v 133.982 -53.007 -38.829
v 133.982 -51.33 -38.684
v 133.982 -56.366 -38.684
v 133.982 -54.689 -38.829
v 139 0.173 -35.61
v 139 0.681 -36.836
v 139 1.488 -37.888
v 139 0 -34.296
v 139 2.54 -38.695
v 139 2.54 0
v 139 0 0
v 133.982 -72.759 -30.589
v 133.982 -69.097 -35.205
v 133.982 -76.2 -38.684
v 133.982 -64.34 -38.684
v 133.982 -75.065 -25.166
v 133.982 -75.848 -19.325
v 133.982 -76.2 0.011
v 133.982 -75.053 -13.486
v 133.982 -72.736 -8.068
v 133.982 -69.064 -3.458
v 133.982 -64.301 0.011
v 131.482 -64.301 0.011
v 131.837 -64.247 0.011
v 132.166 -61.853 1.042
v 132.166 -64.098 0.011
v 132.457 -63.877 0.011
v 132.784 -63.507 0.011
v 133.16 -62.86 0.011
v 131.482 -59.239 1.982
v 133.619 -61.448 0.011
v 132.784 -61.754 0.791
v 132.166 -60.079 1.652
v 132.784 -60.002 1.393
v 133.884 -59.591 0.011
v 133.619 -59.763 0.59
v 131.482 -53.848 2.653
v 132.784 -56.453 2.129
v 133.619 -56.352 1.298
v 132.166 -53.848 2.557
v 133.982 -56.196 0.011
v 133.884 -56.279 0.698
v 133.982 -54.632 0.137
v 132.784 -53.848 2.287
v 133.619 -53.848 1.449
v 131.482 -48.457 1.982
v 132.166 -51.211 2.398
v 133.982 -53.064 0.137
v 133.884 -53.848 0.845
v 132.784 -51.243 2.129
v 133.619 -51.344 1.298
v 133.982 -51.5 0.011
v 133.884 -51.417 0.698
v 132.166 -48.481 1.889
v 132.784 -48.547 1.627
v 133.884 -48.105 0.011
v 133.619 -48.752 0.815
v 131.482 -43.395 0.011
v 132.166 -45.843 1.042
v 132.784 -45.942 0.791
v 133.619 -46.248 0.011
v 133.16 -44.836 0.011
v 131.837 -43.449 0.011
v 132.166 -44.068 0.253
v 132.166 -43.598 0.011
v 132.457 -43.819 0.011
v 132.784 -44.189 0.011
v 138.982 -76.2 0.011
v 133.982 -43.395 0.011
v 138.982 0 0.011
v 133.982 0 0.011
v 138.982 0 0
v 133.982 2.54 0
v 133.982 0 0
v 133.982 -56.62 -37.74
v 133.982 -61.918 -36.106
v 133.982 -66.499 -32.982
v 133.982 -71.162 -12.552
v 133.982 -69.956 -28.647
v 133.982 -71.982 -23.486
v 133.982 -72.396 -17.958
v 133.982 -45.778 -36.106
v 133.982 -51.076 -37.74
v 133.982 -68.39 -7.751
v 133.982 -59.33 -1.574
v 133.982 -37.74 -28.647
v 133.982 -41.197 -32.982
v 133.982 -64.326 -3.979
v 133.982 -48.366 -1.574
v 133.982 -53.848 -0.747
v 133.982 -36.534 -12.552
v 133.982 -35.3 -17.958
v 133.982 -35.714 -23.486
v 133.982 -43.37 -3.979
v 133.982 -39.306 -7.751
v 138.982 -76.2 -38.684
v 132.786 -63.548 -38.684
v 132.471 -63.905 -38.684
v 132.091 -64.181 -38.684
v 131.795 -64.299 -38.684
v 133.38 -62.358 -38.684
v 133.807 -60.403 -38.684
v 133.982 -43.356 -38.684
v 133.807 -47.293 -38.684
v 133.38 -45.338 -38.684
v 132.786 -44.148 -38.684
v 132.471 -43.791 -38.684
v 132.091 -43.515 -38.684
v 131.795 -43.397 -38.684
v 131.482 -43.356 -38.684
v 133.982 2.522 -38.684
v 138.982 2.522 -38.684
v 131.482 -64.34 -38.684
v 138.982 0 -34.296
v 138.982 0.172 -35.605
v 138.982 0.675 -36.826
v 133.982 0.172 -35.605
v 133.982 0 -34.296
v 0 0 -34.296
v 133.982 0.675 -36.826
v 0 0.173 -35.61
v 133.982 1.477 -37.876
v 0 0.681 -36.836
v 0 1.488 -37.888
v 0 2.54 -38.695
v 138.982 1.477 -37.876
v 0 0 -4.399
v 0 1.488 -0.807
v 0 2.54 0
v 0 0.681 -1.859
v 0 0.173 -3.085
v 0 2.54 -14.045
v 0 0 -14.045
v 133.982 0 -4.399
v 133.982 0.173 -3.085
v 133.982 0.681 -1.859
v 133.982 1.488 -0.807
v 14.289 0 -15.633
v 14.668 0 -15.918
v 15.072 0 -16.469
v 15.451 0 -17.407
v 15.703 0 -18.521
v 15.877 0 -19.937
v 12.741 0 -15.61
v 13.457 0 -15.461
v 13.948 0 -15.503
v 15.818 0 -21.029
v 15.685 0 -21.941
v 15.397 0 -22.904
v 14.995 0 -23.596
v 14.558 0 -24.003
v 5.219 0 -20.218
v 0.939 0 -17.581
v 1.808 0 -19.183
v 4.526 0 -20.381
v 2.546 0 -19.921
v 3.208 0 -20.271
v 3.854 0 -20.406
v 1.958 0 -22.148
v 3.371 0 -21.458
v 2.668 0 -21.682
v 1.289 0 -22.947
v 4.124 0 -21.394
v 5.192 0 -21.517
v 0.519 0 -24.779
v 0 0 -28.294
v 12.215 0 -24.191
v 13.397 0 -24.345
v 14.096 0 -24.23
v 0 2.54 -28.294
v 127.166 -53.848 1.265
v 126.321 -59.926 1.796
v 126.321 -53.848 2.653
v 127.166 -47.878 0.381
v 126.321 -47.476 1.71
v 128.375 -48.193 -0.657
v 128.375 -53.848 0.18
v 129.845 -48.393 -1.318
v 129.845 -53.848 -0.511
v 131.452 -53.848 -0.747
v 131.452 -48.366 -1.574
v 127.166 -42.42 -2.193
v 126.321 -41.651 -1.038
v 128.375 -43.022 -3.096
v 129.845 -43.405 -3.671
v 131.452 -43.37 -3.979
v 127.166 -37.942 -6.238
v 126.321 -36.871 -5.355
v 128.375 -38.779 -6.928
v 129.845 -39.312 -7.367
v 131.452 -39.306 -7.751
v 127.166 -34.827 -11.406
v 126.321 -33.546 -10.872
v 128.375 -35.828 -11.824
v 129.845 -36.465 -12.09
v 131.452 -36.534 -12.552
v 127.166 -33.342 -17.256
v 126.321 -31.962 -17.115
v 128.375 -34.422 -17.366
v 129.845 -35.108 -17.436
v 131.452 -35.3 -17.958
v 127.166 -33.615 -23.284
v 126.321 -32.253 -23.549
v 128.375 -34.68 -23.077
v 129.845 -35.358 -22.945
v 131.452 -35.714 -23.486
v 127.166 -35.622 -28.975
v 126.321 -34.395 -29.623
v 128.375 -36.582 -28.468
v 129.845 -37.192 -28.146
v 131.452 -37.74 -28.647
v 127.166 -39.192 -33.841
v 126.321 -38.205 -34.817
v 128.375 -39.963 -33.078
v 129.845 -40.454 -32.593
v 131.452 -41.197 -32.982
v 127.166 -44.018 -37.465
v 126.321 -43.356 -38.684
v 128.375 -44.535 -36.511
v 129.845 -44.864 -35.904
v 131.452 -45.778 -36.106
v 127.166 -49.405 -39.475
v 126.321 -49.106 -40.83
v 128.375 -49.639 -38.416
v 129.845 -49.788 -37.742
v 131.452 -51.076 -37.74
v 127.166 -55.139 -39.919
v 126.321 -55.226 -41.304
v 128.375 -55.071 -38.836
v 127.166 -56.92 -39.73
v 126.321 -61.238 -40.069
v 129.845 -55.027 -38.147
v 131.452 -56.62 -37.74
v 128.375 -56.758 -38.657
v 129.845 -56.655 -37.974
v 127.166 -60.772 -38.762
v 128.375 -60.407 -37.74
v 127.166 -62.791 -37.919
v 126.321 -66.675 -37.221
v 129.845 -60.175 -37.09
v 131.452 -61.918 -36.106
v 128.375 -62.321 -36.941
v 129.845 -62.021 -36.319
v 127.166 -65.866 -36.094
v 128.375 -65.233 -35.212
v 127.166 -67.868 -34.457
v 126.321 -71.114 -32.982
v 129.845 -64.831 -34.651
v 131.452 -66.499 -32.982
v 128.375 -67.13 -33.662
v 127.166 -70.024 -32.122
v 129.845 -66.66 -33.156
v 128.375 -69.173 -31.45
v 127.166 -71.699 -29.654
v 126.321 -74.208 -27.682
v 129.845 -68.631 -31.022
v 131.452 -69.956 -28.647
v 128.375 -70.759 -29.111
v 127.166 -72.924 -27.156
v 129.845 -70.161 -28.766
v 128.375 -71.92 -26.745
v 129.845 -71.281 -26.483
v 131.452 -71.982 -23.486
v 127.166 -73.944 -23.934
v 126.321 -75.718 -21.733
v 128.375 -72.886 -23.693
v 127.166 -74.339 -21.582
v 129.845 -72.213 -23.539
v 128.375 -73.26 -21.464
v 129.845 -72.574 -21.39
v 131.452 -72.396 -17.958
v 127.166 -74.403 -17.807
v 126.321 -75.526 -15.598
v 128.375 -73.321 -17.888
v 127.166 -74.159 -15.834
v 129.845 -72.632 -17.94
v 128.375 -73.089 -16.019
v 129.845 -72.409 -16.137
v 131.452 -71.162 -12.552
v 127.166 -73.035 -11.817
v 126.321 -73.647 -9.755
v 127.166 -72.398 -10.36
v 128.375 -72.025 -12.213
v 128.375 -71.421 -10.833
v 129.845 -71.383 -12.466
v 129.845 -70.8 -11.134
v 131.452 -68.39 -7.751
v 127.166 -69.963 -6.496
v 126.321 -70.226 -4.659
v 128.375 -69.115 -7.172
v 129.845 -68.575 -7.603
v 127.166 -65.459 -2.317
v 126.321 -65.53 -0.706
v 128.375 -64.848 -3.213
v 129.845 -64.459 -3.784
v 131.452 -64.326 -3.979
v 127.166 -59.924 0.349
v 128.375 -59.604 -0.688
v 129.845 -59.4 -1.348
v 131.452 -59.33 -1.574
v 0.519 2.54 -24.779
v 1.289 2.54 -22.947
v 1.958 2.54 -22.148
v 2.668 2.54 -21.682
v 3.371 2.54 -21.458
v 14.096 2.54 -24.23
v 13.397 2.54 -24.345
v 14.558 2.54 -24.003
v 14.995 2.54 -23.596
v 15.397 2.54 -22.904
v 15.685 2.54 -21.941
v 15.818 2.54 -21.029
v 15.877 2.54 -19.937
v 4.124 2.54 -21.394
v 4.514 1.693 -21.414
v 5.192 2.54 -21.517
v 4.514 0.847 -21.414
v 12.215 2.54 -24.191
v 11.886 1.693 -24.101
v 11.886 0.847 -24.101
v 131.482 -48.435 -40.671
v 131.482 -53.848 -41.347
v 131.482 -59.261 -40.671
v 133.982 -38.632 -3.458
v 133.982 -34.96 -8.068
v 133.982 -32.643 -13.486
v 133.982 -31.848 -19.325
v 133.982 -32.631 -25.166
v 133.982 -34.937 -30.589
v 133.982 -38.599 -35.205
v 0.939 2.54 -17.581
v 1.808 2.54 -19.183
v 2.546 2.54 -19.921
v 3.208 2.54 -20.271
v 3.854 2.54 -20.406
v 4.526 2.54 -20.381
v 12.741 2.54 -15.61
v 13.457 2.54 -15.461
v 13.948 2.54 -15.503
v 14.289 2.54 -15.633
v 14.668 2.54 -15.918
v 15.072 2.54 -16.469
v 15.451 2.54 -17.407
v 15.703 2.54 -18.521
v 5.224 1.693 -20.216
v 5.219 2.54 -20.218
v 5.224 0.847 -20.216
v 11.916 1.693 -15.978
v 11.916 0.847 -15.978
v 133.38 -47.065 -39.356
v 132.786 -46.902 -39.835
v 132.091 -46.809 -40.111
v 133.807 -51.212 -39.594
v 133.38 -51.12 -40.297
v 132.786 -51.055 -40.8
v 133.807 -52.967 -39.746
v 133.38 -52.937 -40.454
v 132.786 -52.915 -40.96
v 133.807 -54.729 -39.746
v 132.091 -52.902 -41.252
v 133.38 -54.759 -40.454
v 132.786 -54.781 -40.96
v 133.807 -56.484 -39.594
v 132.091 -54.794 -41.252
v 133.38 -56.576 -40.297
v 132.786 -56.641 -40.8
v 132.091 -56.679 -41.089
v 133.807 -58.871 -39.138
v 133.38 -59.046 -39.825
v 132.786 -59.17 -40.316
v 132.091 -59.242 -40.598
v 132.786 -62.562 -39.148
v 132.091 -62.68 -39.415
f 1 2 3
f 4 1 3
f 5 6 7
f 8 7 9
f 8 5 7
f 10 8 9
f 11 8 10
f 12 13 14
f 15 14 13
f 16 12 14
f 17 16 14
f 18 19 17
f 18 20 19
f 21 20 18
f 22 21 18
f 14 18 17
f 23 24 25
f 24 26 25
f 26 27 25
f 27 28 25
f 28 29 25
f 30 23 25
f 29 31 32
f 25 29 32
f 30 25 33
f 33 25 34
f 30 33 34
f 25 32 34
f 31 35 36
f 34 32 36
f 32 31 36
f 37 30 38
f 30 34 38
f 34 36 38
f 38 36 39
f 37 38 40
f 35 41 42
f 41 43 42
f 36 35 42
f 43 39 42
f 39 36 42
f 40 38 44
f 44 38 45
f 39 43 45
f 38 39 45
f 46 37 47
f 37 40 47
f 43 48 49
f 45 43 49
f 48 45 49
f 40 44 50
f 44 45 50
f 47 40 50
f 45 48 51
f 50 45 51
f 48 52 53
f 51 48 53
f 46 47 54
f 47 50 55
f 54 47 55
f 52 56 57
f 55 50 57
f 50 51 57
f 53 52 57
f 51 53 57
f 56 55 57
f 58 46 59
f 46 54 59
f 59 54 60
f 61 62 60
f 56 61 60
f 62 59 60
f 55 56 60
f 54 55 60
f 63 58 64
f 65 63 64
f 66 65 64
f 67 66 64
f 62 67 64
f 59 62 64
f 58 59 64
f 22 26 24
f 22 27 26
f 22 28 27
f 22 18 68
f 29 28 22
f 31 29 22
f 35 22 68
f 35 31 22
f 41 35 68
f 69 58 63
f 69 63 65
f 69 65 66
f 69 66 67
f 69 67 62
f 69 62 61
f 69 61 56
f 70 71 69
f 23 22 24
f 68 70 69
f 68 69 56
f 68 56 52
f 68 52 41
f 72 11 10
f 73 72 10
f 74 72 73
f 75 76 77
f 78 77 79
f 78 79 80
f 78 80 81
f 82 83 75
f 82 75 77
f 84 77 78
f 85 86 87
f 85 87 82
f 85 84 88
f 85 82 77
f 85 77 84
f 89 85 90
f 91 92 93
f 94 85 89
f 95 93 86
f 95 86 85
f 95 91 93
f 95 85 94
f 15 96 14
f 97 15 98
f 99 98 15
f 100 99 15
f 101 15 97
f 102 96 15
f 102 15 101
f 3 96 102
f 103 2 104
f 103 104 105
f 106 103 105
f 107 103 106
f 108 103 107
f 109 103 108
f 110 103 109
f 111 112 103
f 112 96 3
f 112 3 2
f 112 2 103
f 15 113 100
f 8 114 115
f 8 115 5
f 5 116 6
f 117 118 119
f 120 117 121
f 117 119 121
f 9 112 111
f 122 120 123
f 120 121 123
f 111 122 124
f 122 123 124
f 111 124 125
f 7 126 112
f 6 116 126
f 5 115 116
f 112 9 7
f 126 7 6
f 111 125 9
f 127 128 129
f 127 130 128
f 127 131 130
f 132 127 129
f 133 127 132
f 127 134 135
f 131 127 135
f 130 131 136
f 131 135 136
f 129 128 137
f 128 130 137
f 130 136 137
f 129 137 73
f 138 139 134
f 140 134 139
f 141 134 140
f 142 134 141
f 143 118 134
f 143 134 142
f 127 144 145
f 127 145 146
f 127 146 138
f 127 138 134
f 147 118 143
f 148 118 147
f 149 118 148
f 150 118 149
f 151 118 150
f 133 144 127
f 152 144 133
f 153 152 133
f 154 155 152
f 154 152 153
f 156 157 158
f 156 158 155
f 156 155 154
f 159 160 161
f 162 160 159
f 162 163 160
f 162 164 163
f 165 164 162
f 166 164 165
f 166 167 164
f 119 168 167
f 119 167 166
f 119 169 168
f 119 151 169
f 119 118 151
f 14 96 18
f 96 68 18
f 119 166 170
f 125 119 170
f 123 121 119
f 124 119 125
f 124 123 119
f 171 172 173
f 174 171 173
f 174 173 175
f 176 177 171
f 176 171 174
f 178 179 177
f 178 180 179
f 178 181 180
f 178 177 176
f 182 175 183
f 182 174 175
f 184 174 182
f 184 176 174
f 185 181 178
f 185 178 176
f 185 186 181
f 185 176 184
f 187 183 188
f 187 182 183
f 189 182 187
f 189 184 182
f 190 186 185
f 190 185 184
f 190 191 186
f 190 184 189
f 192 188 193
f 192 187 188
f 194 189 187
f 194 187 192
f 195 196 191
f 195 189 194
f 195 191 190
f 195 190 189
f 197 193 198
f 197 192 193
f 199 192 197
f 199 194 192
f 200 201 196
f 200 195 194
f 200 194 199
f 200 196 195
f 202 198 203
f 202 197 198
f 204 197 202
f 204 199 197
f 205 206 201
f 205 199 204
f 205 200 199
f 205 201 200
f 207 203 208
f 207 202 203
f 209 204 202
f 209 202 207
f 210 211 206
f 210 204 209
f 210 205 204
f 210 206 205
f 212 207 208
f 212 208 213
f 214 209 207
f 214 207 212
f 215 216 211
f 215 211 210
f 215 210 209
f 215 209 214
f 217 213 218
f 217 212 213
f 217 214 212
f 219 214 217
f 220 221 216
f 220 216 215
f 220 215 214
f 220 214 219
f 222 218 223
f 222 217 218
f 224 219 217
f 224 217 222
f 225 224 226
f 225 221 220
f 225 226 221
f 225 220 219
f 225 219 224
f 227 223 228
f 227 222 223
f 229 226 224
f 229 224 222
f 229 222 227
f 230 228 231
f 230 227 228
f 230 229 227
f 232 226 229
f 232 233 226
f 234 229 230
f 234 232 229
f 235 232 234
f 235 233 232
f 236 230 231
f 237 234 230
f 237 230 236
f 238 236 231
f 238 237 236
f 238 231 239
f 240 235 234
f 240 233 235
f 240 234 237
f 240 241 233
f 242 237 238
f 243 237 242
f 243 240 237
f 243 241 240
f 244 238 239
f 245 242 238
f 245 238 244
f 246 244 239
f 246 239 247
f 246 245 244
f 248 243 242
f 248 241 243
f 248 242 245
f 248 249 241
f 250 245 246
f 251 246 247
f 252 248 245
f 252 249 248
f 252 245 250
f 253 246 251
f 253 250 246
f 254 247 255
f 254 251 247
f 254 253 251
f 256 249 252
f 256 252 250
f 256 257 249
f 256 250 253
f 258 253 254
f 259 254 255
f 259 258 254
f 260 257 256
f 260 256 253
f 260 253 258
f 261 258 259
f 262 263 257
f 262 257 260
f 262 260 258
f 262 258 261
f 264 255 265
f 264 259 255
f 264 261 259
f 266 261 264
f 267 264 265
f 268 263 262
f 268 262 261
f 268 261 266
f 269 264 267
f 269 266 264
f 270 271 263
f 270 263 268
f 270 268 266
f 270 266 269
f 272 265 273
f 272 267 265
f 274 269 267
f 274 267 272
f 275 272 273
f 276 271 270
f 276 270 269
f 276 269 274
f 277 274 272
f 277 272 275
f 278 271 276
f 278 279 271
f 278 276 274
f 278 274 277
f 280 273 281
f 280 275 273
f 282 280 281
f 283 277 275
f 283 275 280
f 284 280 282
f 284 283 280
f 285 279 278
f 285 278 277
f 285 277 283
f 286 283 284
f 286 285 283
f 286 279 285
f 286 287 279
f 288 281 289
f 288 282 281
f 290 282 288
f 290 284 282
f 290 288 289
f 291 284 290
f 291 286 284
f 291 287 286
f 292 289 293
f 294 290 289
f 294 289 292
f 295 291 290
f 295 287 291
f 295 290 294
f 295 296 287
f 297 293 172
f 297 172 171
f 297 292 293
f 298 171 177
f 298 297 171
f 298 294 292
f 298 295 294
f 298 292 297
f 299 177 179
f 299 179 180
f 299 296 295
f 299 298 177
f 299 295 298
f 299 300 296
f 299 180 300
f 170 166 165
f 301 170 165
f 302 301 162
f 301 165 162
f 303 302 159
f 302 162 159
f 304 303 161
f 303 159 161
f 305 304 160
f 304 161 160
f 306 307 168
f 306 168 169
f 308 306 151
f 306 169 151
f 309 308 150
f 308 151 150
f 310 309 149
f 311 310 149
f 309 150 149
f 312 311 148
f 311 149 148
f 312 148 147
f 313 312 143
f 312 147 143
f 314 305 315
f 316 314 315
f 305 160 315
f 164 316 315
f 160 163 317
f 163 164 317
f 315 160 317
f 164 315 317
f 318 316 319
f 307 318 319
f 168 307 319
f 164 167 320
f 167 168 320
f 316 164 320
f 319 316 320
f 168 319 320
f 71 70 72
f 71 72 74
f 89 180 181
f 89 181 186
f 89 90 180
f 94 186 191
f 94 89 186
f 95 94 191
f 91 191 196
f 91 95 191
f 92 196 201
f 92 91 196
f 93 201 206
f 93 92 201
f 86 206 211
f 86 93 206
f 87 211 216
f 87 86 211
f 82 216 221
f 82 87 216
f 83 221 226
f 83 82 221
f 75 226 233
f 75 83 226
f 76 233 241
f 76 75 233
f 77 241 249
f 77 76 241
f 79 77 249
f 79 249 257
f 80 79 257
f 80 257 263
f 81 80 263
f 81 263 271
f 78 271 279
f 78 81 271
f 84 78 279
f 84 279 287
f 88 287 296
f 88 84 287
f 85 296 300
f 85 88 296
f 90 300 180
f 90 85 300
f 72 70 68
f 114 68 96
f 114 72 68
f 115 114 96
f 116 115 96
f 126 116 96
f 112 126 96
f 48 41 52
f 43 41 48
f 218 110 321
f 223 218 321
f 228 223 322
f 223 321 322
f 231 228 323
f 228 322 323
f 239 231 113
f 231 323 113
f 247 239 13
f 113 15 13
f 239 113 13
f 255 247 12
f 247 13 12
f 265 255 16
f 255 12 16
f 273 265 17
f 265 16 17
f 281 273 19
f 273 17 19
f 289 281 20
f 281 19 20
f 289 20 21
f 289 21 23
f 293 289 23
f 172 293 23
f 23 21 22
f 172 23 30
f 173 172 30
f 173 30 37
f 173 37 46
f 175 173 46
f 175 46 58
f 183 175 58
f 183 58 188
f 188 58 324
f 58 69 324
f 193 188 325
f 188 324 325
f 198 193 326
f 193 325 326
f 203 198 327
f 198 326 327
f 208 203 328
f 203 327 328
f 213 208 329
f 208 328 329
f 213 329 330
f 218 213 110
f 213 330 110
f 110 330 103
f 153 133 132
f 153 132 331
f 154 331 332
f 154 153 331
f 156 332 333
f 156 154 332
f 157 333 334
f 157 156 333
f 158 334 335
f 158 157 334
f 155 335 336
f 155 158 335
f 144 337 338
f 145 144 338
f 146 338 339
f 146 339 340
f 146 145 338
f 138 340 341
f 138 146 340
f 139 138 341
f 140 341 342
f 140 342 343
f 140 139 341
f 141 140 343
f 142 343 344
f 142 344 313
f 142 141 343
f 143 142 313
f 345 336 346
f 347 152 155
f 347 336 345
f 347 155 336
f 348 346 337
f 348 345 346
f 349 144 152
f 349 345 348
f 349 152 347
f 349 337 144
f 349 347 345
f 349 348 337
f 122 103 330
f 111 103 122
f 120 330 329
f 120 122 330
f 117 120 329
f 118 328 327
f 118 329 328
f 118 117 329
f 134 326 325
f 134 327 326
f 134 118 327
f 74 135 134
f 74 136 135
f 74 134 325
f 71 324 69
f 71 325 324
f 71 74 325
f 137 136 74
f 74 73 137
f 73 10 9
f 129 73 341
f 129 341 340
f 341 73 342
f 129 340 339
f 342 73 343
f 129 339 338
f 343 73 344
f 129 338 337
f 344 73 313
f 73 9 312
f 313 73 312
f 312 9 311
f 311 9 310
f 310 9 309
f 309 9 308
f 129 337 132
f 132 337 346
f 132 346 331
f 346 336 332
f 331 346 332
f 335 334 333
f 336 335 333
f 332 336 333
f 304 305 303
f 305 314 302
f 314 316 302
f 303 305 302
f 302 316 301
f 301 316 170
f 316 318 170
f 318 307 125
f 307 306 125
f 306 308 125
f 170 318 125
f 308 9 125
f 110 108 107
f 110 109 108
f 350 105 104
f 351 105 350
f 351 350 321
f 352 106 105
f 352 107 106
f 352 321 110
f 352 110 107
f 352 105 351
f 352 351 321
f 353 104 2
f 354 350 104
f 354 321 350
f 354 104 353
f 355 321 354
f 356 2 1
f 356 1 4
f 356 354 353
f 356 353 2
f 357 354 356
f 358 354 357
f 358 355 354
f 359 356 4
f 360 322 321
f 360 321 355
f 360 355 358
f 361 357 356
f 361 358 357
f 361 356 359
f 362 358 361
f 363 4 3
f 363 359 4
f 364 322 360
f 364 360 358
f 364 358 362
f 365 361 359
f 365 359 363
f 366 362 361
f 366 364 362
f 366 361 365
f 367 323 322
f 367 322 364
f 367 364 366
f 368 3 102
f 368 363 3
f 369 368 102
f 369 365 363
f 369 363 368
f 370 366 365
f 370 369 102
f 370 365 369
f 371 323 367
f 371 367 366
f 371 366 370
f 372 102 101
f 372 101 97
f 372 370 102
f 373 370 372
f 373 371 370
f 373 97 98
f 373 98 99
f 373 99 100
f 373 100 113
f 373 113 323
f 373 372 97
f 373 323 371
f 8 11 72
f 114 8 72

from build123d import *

# Parameters (mm, degrees)
BOSS_EXTRUDE1_DEPTH = 2.54
BOSS_EXTRUDE2_DEPTH = 76.2
SKETCH6_R           = 22
SKETCH6_R_2         = 18.600000000000005
BOSS_EXTRUDE5_DEPTH = 7.660427645478581
FILLET10_R          = 2.5
FILLET11_R          = 2.5
FILLET13_R          = 5.57093307
FILLET15_R          = 5.08
FILLET16_R          = 5.08


with BuildPart() as part:
    # Sketch1 → Boss-Extrude1 (new body)
    with BuildSketch(Plane(origin=(0, 0, 0), x_dir=(1, 0, 0), z_dir=(0, 1, 0))):
        with BuildLine():
            Line((0, 28.293848376378605), (0, 38.694970839027235))
            Line((0, 38.694970839027235), (139, 38.694970839027235))
            Line((139, 38.694970839027235), (139, 0))
            Line((139, 0), (0, 0))
            Line((0, 0), (0, 14.045240588338004))
            add(Edge.make_bspline(
                [(0, 14.045240588338004), (3.0899762489281395, 31.623018189199616), (14.68245796656543, 5.677642965238619), (15.876552294634884, 19.936564793057386)],
                knots=[0, 0, 0, 0, 1, 1, 1, 1], degree=3))
            add(Edge.make_bspline(
                [(0, 28.293848376378605), (1.0033062764081593, 11.15878467888299), (15.658213538640268, 32.998799430672), (15.876552294634884, 19.936564793057386)],
                knots=[0, 0, 0, 0, 1, 1, 1, 1], degree=3))
        make_face()
    extrude(amount=BOSS_EXTRUDE1_DEPTH)

    # Sketch5 → Boss-Extrude2 (add)
    with BuildSketch(Plane.XZ):
        Polygon((138.98190867121684, -38.68428246542061), (133.98190867121684, -38.68428246542061), (133.98190867121684, 0.01068837360662839), (138.98190867121684, 0.010688373606629), align=None)
    extrude(amount=BOSS_EXTRUDE2_DEPTH)

    # Sketch6 → Boss-Extrude5 (add)
    with BuildSketch(Plane.ZY.offset(-133.98190867121684)):
        with Locations(Location((-19.347485419513617, -53.847999999999985, 0), (0, 0, 151.515398593))):
            Circle(SKETCH6_R)
        with Locations((-19.347485419513617, -53.847999999999985)):
            Circle(SKETCH6_R_2, mode=Mode.SUBTRACT)
    extrude(amount=BOSS_EXTRUDE5_DEPTH)

    # Fillet10
    # the kernel refuses this fillet: 2.5 mm, written as the material it takes off along each edge
    with BuildSketch(Plane(origin=(133.98190867121684, -53.847999999999985, -19.347485419513617), x_dir=(0, 0.7041935749471109, -0.7100080344638416), z_dir=(0, 0.7100080344638416, 0.7041935749471109))) as fillet10_piece_1_section:
        with BuildLine():
            CenterArc((22 - FILLET10_R, FILLET10_R), FILLET10_R, 269.9999999999999, 90.00000000000011)
            Line((22 - FILLET10_R, 0), (22, 0))
            Line((22, 0), (22, FILLET10_R))
        make_face()
    fillet10_piece_1 = revolve(axis=Axis((133.98190867121684, -53.847999999999985, -19.347485419513617), (-1, 0, 0)), revolution_arc=89.52886192357941, mode=Mode.PRIVATE)
    fillet10_piece_1 = split(fillet10_piece_1, bisect_by=Plane(origin=(133.27050053527873, -53.847999999999985, -38.68428246542061), z_dir=(0, 0, -1)), keep=Keep.TOP, mode=Mode.PRIVATE)
    add(fillet10_piece_1, mode=Mode.SUBTRACT)

    # Fillet11
    fillet11_edges = [part.edges().sort_by_distance(p)[0] for p in [
        (133.98190867121684, -53.84800000000051, 2.6525145804863826),
    ]]
    fillet(fillet11_edges, radius=FILLET11_R)

    # Fillet13
    # the kernel refuses this fillet: 5.57093307 mm, written as the material it takes off along each edge
    with BuildSketch(Plane(origin=(126.32148102573827, -53.847999999999985, -19.347485419513617), x_dir=(0, 0, 1), z_dir=(0, -1, 0))) as fillet13_piece_1:
        with BuildLine():
            CenterArc((24.170933070445475, -5.130530662517188), FILLET13_R, 112.93516881526322, 67.06483118473678)
            Line((18.600000000000005, -5.130530662517188), (18.488581338591096, -5.130530662517188))
            Line((18.488581338591096, -5.130530662517188), (18.488581338591096, 0))
            Line((18.488581338591096, 0), (18.600000000000005, 0.111418661408905))
            ThreePointArc((18.600000000000005, 0.111418661408905), (20.3, 0.111418661408905), (21.956581338591086, 0.1026106132503628))
            Line((21.956581338591086, 0.1026106132503628), (21.999999999999996, 1.421e-14))
        make_face()
    revolve(axis=Axis((126.32148102573827, -53.847999999999985, -19.347485419513617), (-1, 0, 0)), mode=Mode.SUBTRACT)

    # Fillet15
    # the kernel refuses this fillet: 5.08 mm, written as the material it takes off along each edge
    with BuildSketch(Plane(origin=(-10.998522628063, 0, -38.694970839027235), x_dir=(0, 0, 1), z_dir=(1, 0, 0))) as fillet15_piece_1_section:
        with BuildLine():
            CenterArc((4.3994090512251915, -5.079999999999999), FILLET15_R, 90, 60.00000000000139)
            Line((1.8474e-13, -2.5400000000001057), (0, 0))
            Line((0, 0), (4.3994090512251915, 0))
        make_face()
    fillet15_piece_1 = extrude(amount=160.997045256126, mode=Mode.PRIVATE)
    fillet15_piece_1 = split(fillet15_piece_1, bisect_by=Plane(origin=(133.98190867121684, 0.6664663042665507, -36.831394815078376), z_dir=(-1, 0, 0)), keep=Keep.TOP, mode=Mode.PRIVATE)
    add(fillet15_piece_1, mode=Mode.SUBTRACT)
    with BuildSketch(Plane(origin=(-10.998522628063, 0, -38.694970839027235), x_dir=(0, 0, 1), z_dir=(1, 0, 0))) as fillet15_piece_2_section:
        with BuildLine():
            CenterArc((4.3994090512251915, -5.079999999999999), FILLET15_R, 90, 60.00000000000139)
            Line((1.8474e-13, -2.5400000000001057), (0, 0))
            Line((0, 0), (4.3994090512251915, 0))
        make_face()
    fillet15_piece_2 = extrude(amount=160.997045256126, mode=Mode.PRIVATE)
    fillet15_piece_2 = split(fillet15_piece_2, bisect_by=Plane(origin=(136.48190867121684, 2.530272803909126, -38.68428246542061), z_dir=(0, 0, -1)), keep=Keep.TOP, mode=Mode.PRIVATE)
    add(fillet15_piece_2, mode=Mode.SUBTRACT)
    with BuildSketch(Plane(origin=(-10.998522628063, 0, -38.694970839027235), x_dir=(0, 0, 1), z_dir=(1, 0, 0))) as fillet15_piece_3_section:
        with BuildLine():
            CenterArc((4.3994090512251915, -5.079999999999999), FILLET15_R, 90, 60.00000000000139)
            Line((1.8474e-13, -2.5400000000001057), (0, 0))
            Line((0, 0), (4.3994090512251915, 0))
        make_face()
    fillet15_piece_3 = extrude(amount=160.997045256126, mode=Mode.PRIVATE)
    fillet15_piece_3 = split(fillet15_piece_3, bisect_by=Plane(origin=(138.98190867121684, 0.6664663042665507, -36.831394815078376), z_dir=(1, 0, 0)), keep=Keep.TOP, mode=Mode.PRIVATE)
    add(fillet15_piece_3, mode=Mode.SUBTRACT)

    # Fillet16
    # the kernel refuses this fillet: 5.08 mm, written as the material it takes off along each edge
    with BuildSketch(Plane(origin=(133.98190867121684, 0, 0), x_dir=(0, 0, -1), z_dir=(-1, 0, 0))) as fillet16_piece_1:
        with BuildLine():
            CenterArc((4.399409051225193, -5.079999999999999), FILLET16_R, 90, 60.00000000000139)
            Line((1.8474e-13, -2.5400000000001066), (0, 0))
            Line((0, 0), (4.399409051225193, 0))
        make_face()
    extrude(amount=144.98043129927981, mode=Mode.SUBTRACT)


solid = part.part
